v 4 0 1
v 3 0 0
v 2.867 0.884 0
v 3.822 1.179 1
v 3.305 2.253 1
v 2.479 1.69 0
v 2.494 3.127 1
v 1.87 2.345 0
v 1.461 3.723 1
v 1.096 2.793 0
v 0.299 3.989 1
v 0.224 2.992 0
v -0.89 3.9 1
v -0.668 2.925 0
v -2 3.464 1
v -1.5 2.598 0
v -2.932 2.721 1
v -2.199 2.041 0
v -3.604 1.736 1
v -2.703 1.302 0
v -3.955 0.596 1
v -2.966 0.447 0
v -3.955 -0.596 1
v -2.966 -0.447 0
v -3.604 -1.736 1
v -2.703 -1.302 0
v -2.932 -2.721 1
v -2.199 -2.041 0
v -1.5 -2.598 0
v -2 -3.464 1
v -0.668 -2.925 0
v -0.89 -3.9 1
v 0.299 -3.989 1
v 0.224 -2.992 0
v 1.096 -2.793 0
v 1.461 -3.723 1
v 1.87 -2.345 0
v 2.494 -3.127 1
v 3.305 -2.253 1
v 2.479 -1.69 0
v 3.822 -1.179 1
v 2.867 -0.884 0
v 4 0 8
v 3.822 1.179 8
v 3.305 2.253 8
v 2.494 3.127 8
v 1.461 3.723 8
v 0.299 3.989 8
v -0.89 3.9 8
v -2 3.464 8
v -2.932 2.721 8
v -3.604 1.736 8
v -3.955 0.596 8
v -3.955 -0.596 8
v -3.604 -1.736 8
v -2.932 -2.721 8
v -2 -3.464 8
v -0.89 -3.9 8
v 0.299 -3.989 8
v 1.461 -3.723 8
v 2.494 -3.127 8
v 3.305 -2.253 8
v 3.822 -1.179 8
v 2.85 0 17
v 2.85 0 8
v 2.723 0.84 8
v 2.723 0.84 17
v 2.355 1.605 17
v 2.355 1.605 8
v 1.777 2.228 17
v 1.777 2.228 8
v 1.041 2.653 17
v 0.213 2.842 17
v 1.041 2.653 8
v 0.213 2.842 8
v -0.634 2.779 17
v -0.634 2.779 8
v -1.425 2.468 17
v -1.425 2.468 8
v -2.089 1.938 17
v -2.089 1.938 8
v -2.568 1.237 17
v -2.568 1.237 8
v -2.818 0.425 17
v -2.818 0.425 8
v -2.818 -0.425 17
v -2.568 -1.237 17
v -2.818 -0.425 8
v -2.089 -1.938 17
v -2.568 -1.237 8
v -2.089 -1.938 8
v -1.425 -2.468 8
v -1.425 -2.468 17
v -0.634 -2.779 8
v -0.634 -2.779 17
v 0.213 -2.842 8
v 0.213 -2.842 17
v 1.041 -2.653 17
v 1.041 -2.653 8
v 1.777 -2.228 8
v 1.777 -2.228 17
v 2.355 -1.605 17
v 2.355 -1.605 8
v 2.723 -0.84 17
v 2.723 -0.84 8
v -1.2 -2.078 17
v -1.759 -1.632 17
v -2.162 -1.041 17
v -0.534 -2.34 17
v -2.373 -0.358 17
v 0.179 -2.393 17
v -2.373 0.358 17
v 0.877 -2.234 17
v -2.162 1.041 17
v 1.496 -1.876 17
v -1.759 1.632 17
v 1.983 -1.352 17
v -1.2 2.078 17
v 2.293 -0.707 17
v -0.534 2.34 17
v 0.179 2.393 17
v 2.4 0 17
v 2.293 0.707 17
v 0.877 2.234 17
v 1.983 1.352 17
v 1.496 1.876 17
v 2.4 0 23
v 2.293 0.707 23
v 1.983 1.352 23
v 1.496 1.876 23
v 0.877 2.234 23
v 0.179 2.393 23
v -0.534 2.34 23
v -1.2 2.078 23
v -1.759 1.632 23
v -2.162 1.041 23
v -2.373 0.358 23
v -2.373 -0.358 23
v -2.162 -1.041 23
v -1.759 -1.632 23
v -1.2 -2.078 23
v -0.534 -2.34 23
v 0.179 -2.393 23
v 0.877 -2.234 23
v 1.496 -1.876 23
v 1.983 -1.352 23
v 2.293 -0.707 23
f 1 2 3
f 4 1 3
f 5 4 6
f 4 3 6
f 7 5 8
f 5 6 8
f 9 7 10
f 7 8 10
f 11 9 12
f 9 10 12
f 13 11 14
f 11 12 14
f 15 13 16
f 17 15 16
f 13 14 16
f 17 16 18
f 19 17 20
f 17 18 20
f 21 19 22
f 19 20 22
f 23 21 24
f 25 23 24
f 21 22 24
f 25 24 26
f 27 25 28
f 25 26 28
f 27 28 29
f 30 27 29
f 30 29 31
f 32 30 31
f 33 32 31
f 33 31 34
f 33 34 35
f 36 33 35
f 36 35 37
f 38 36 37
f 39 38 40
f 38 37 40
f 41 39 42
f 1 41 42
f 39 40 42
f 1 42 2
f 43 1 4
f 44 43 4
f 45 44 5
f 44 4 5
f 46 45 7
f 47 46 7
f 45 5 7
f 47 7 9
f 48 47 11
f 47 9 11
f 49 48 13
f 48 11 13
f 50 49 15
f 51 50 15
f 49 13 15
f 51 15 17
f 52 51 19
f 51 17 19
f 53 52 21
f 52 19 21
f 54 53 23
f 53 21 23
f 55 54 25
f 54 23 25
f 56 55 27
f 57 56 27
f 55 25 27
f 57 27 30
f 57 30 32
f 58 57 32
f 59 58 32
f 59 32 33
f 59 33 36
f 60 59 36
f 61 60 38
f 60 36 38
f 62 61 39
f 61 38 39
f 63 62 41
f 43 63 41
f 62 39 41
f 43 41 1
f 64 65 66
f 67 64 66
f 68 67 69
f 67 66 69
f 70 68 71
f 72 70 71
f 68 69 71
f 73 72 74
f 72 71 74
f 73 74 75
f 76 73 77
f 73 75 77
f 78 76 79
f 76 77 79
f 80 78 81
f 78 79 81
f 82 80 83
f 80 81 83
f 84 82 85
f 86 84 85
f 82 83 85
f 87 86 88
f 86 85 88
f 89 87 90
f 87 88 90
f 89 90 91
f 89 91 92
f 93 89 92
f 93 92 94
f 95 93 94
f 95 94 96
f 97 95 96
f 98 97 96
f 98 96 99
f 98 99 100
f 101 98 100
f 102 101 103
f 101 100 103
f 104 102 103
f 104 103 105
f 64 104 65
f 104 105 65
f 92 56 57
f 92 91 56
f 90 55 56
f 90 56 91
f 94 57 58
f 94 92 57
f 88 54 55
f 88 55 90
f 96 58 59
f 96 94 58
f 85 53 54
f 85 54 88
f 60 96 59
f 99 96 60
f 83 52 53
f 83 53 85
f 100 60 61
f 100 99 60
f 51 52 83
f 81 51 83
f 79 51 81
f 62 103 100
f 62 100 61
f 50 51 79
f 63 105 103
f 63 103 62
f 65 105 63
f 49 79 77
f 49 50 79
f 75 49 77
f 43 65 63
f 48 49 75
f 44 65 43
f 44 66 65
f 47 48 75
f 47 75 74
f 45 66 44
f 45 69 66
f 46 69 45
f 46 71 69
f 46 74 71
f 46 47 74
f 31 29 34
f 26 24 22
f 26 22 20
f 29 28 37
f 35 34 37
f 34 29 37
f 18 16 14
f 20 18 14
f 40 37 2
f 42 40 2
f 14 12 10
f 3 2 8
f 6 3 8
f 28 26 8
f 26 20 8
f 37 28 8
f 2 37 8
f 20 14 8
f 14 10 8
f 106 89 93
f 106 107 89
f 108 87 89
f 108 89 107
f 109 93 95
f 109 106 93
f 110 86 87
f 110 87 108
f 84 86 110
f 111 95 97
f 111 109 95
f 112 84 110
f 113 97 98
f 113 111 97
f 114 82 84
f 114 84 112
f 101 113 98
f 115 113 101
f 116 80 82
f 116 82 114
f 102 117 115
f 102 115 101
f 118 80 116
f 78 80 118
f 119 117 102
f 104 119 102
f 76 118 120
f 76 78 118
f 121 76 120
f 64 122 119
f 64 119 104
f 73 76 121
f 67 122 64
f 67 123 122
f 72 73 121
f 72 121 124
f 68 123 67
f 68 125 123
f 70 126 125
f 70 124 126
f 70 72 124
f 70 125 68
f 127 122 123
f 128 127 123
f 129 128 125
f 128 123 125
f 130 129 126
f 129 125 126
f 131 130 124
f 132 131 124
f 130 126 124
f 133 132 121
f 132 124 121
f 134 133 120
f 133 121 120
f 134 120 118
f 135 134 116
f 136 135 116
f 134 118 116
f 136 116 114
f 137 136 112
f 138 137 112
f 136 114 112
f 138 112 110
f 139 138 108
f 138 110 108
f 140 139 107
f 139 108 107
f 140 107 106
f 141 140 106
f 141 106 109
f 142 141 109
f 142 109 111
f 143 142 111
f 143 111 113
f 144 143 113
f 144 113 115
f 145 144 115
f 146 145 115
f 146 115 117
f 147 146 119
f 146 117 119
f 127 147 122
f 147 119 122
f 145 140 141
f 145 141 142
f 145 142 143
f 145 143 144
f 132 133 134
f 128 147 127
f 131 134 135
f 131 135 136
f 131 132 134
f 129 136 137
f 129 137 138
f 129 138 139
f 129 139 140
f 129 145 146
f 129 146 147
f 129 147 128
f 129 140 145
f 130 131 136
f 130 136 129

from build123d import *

# Parameters (mm, degrees)
SKETCH_R     = 4
PAD_DEPTH    = 8
SKETCH001_R  = 2.85
PAD001_DEPTH = 9
SKETCH002_R  = 2.4
PAD002_DEPTH = 6
CHAMFER_SIZE = 1


with BuildPart() as part:
    # Sketch → Pad (new body)
    with BuildSketch(Plane.XY):
        Circle(SKETCH_R)
    extrude(amount=PAD_DEPTH)

    # Sketch001 (on Face3 of Pad) → Pad001 (join)
    with BuildSketch(Plane.XY.offset(8)):
        Circle(SKETCH001_R)
    extrude(amount=PAD001_DEPTH)

    # Sketch002 (on Face5 of Pad001) → Pad002 (join)
    with BuildSketch(Plane.XY.offset(17)):
        Circle(SKETCH002_R)
    extrude(amount=PAD002_DEPTH)

    # Chamfer
    chamfer_edges = [part.edges().sort_by_distance(p)[0] for p in [
        (-4, 0, 0),
    ]]
    chamfer(chamfer_edges, length=CHAMFER_SIZE)


solid = part.part
